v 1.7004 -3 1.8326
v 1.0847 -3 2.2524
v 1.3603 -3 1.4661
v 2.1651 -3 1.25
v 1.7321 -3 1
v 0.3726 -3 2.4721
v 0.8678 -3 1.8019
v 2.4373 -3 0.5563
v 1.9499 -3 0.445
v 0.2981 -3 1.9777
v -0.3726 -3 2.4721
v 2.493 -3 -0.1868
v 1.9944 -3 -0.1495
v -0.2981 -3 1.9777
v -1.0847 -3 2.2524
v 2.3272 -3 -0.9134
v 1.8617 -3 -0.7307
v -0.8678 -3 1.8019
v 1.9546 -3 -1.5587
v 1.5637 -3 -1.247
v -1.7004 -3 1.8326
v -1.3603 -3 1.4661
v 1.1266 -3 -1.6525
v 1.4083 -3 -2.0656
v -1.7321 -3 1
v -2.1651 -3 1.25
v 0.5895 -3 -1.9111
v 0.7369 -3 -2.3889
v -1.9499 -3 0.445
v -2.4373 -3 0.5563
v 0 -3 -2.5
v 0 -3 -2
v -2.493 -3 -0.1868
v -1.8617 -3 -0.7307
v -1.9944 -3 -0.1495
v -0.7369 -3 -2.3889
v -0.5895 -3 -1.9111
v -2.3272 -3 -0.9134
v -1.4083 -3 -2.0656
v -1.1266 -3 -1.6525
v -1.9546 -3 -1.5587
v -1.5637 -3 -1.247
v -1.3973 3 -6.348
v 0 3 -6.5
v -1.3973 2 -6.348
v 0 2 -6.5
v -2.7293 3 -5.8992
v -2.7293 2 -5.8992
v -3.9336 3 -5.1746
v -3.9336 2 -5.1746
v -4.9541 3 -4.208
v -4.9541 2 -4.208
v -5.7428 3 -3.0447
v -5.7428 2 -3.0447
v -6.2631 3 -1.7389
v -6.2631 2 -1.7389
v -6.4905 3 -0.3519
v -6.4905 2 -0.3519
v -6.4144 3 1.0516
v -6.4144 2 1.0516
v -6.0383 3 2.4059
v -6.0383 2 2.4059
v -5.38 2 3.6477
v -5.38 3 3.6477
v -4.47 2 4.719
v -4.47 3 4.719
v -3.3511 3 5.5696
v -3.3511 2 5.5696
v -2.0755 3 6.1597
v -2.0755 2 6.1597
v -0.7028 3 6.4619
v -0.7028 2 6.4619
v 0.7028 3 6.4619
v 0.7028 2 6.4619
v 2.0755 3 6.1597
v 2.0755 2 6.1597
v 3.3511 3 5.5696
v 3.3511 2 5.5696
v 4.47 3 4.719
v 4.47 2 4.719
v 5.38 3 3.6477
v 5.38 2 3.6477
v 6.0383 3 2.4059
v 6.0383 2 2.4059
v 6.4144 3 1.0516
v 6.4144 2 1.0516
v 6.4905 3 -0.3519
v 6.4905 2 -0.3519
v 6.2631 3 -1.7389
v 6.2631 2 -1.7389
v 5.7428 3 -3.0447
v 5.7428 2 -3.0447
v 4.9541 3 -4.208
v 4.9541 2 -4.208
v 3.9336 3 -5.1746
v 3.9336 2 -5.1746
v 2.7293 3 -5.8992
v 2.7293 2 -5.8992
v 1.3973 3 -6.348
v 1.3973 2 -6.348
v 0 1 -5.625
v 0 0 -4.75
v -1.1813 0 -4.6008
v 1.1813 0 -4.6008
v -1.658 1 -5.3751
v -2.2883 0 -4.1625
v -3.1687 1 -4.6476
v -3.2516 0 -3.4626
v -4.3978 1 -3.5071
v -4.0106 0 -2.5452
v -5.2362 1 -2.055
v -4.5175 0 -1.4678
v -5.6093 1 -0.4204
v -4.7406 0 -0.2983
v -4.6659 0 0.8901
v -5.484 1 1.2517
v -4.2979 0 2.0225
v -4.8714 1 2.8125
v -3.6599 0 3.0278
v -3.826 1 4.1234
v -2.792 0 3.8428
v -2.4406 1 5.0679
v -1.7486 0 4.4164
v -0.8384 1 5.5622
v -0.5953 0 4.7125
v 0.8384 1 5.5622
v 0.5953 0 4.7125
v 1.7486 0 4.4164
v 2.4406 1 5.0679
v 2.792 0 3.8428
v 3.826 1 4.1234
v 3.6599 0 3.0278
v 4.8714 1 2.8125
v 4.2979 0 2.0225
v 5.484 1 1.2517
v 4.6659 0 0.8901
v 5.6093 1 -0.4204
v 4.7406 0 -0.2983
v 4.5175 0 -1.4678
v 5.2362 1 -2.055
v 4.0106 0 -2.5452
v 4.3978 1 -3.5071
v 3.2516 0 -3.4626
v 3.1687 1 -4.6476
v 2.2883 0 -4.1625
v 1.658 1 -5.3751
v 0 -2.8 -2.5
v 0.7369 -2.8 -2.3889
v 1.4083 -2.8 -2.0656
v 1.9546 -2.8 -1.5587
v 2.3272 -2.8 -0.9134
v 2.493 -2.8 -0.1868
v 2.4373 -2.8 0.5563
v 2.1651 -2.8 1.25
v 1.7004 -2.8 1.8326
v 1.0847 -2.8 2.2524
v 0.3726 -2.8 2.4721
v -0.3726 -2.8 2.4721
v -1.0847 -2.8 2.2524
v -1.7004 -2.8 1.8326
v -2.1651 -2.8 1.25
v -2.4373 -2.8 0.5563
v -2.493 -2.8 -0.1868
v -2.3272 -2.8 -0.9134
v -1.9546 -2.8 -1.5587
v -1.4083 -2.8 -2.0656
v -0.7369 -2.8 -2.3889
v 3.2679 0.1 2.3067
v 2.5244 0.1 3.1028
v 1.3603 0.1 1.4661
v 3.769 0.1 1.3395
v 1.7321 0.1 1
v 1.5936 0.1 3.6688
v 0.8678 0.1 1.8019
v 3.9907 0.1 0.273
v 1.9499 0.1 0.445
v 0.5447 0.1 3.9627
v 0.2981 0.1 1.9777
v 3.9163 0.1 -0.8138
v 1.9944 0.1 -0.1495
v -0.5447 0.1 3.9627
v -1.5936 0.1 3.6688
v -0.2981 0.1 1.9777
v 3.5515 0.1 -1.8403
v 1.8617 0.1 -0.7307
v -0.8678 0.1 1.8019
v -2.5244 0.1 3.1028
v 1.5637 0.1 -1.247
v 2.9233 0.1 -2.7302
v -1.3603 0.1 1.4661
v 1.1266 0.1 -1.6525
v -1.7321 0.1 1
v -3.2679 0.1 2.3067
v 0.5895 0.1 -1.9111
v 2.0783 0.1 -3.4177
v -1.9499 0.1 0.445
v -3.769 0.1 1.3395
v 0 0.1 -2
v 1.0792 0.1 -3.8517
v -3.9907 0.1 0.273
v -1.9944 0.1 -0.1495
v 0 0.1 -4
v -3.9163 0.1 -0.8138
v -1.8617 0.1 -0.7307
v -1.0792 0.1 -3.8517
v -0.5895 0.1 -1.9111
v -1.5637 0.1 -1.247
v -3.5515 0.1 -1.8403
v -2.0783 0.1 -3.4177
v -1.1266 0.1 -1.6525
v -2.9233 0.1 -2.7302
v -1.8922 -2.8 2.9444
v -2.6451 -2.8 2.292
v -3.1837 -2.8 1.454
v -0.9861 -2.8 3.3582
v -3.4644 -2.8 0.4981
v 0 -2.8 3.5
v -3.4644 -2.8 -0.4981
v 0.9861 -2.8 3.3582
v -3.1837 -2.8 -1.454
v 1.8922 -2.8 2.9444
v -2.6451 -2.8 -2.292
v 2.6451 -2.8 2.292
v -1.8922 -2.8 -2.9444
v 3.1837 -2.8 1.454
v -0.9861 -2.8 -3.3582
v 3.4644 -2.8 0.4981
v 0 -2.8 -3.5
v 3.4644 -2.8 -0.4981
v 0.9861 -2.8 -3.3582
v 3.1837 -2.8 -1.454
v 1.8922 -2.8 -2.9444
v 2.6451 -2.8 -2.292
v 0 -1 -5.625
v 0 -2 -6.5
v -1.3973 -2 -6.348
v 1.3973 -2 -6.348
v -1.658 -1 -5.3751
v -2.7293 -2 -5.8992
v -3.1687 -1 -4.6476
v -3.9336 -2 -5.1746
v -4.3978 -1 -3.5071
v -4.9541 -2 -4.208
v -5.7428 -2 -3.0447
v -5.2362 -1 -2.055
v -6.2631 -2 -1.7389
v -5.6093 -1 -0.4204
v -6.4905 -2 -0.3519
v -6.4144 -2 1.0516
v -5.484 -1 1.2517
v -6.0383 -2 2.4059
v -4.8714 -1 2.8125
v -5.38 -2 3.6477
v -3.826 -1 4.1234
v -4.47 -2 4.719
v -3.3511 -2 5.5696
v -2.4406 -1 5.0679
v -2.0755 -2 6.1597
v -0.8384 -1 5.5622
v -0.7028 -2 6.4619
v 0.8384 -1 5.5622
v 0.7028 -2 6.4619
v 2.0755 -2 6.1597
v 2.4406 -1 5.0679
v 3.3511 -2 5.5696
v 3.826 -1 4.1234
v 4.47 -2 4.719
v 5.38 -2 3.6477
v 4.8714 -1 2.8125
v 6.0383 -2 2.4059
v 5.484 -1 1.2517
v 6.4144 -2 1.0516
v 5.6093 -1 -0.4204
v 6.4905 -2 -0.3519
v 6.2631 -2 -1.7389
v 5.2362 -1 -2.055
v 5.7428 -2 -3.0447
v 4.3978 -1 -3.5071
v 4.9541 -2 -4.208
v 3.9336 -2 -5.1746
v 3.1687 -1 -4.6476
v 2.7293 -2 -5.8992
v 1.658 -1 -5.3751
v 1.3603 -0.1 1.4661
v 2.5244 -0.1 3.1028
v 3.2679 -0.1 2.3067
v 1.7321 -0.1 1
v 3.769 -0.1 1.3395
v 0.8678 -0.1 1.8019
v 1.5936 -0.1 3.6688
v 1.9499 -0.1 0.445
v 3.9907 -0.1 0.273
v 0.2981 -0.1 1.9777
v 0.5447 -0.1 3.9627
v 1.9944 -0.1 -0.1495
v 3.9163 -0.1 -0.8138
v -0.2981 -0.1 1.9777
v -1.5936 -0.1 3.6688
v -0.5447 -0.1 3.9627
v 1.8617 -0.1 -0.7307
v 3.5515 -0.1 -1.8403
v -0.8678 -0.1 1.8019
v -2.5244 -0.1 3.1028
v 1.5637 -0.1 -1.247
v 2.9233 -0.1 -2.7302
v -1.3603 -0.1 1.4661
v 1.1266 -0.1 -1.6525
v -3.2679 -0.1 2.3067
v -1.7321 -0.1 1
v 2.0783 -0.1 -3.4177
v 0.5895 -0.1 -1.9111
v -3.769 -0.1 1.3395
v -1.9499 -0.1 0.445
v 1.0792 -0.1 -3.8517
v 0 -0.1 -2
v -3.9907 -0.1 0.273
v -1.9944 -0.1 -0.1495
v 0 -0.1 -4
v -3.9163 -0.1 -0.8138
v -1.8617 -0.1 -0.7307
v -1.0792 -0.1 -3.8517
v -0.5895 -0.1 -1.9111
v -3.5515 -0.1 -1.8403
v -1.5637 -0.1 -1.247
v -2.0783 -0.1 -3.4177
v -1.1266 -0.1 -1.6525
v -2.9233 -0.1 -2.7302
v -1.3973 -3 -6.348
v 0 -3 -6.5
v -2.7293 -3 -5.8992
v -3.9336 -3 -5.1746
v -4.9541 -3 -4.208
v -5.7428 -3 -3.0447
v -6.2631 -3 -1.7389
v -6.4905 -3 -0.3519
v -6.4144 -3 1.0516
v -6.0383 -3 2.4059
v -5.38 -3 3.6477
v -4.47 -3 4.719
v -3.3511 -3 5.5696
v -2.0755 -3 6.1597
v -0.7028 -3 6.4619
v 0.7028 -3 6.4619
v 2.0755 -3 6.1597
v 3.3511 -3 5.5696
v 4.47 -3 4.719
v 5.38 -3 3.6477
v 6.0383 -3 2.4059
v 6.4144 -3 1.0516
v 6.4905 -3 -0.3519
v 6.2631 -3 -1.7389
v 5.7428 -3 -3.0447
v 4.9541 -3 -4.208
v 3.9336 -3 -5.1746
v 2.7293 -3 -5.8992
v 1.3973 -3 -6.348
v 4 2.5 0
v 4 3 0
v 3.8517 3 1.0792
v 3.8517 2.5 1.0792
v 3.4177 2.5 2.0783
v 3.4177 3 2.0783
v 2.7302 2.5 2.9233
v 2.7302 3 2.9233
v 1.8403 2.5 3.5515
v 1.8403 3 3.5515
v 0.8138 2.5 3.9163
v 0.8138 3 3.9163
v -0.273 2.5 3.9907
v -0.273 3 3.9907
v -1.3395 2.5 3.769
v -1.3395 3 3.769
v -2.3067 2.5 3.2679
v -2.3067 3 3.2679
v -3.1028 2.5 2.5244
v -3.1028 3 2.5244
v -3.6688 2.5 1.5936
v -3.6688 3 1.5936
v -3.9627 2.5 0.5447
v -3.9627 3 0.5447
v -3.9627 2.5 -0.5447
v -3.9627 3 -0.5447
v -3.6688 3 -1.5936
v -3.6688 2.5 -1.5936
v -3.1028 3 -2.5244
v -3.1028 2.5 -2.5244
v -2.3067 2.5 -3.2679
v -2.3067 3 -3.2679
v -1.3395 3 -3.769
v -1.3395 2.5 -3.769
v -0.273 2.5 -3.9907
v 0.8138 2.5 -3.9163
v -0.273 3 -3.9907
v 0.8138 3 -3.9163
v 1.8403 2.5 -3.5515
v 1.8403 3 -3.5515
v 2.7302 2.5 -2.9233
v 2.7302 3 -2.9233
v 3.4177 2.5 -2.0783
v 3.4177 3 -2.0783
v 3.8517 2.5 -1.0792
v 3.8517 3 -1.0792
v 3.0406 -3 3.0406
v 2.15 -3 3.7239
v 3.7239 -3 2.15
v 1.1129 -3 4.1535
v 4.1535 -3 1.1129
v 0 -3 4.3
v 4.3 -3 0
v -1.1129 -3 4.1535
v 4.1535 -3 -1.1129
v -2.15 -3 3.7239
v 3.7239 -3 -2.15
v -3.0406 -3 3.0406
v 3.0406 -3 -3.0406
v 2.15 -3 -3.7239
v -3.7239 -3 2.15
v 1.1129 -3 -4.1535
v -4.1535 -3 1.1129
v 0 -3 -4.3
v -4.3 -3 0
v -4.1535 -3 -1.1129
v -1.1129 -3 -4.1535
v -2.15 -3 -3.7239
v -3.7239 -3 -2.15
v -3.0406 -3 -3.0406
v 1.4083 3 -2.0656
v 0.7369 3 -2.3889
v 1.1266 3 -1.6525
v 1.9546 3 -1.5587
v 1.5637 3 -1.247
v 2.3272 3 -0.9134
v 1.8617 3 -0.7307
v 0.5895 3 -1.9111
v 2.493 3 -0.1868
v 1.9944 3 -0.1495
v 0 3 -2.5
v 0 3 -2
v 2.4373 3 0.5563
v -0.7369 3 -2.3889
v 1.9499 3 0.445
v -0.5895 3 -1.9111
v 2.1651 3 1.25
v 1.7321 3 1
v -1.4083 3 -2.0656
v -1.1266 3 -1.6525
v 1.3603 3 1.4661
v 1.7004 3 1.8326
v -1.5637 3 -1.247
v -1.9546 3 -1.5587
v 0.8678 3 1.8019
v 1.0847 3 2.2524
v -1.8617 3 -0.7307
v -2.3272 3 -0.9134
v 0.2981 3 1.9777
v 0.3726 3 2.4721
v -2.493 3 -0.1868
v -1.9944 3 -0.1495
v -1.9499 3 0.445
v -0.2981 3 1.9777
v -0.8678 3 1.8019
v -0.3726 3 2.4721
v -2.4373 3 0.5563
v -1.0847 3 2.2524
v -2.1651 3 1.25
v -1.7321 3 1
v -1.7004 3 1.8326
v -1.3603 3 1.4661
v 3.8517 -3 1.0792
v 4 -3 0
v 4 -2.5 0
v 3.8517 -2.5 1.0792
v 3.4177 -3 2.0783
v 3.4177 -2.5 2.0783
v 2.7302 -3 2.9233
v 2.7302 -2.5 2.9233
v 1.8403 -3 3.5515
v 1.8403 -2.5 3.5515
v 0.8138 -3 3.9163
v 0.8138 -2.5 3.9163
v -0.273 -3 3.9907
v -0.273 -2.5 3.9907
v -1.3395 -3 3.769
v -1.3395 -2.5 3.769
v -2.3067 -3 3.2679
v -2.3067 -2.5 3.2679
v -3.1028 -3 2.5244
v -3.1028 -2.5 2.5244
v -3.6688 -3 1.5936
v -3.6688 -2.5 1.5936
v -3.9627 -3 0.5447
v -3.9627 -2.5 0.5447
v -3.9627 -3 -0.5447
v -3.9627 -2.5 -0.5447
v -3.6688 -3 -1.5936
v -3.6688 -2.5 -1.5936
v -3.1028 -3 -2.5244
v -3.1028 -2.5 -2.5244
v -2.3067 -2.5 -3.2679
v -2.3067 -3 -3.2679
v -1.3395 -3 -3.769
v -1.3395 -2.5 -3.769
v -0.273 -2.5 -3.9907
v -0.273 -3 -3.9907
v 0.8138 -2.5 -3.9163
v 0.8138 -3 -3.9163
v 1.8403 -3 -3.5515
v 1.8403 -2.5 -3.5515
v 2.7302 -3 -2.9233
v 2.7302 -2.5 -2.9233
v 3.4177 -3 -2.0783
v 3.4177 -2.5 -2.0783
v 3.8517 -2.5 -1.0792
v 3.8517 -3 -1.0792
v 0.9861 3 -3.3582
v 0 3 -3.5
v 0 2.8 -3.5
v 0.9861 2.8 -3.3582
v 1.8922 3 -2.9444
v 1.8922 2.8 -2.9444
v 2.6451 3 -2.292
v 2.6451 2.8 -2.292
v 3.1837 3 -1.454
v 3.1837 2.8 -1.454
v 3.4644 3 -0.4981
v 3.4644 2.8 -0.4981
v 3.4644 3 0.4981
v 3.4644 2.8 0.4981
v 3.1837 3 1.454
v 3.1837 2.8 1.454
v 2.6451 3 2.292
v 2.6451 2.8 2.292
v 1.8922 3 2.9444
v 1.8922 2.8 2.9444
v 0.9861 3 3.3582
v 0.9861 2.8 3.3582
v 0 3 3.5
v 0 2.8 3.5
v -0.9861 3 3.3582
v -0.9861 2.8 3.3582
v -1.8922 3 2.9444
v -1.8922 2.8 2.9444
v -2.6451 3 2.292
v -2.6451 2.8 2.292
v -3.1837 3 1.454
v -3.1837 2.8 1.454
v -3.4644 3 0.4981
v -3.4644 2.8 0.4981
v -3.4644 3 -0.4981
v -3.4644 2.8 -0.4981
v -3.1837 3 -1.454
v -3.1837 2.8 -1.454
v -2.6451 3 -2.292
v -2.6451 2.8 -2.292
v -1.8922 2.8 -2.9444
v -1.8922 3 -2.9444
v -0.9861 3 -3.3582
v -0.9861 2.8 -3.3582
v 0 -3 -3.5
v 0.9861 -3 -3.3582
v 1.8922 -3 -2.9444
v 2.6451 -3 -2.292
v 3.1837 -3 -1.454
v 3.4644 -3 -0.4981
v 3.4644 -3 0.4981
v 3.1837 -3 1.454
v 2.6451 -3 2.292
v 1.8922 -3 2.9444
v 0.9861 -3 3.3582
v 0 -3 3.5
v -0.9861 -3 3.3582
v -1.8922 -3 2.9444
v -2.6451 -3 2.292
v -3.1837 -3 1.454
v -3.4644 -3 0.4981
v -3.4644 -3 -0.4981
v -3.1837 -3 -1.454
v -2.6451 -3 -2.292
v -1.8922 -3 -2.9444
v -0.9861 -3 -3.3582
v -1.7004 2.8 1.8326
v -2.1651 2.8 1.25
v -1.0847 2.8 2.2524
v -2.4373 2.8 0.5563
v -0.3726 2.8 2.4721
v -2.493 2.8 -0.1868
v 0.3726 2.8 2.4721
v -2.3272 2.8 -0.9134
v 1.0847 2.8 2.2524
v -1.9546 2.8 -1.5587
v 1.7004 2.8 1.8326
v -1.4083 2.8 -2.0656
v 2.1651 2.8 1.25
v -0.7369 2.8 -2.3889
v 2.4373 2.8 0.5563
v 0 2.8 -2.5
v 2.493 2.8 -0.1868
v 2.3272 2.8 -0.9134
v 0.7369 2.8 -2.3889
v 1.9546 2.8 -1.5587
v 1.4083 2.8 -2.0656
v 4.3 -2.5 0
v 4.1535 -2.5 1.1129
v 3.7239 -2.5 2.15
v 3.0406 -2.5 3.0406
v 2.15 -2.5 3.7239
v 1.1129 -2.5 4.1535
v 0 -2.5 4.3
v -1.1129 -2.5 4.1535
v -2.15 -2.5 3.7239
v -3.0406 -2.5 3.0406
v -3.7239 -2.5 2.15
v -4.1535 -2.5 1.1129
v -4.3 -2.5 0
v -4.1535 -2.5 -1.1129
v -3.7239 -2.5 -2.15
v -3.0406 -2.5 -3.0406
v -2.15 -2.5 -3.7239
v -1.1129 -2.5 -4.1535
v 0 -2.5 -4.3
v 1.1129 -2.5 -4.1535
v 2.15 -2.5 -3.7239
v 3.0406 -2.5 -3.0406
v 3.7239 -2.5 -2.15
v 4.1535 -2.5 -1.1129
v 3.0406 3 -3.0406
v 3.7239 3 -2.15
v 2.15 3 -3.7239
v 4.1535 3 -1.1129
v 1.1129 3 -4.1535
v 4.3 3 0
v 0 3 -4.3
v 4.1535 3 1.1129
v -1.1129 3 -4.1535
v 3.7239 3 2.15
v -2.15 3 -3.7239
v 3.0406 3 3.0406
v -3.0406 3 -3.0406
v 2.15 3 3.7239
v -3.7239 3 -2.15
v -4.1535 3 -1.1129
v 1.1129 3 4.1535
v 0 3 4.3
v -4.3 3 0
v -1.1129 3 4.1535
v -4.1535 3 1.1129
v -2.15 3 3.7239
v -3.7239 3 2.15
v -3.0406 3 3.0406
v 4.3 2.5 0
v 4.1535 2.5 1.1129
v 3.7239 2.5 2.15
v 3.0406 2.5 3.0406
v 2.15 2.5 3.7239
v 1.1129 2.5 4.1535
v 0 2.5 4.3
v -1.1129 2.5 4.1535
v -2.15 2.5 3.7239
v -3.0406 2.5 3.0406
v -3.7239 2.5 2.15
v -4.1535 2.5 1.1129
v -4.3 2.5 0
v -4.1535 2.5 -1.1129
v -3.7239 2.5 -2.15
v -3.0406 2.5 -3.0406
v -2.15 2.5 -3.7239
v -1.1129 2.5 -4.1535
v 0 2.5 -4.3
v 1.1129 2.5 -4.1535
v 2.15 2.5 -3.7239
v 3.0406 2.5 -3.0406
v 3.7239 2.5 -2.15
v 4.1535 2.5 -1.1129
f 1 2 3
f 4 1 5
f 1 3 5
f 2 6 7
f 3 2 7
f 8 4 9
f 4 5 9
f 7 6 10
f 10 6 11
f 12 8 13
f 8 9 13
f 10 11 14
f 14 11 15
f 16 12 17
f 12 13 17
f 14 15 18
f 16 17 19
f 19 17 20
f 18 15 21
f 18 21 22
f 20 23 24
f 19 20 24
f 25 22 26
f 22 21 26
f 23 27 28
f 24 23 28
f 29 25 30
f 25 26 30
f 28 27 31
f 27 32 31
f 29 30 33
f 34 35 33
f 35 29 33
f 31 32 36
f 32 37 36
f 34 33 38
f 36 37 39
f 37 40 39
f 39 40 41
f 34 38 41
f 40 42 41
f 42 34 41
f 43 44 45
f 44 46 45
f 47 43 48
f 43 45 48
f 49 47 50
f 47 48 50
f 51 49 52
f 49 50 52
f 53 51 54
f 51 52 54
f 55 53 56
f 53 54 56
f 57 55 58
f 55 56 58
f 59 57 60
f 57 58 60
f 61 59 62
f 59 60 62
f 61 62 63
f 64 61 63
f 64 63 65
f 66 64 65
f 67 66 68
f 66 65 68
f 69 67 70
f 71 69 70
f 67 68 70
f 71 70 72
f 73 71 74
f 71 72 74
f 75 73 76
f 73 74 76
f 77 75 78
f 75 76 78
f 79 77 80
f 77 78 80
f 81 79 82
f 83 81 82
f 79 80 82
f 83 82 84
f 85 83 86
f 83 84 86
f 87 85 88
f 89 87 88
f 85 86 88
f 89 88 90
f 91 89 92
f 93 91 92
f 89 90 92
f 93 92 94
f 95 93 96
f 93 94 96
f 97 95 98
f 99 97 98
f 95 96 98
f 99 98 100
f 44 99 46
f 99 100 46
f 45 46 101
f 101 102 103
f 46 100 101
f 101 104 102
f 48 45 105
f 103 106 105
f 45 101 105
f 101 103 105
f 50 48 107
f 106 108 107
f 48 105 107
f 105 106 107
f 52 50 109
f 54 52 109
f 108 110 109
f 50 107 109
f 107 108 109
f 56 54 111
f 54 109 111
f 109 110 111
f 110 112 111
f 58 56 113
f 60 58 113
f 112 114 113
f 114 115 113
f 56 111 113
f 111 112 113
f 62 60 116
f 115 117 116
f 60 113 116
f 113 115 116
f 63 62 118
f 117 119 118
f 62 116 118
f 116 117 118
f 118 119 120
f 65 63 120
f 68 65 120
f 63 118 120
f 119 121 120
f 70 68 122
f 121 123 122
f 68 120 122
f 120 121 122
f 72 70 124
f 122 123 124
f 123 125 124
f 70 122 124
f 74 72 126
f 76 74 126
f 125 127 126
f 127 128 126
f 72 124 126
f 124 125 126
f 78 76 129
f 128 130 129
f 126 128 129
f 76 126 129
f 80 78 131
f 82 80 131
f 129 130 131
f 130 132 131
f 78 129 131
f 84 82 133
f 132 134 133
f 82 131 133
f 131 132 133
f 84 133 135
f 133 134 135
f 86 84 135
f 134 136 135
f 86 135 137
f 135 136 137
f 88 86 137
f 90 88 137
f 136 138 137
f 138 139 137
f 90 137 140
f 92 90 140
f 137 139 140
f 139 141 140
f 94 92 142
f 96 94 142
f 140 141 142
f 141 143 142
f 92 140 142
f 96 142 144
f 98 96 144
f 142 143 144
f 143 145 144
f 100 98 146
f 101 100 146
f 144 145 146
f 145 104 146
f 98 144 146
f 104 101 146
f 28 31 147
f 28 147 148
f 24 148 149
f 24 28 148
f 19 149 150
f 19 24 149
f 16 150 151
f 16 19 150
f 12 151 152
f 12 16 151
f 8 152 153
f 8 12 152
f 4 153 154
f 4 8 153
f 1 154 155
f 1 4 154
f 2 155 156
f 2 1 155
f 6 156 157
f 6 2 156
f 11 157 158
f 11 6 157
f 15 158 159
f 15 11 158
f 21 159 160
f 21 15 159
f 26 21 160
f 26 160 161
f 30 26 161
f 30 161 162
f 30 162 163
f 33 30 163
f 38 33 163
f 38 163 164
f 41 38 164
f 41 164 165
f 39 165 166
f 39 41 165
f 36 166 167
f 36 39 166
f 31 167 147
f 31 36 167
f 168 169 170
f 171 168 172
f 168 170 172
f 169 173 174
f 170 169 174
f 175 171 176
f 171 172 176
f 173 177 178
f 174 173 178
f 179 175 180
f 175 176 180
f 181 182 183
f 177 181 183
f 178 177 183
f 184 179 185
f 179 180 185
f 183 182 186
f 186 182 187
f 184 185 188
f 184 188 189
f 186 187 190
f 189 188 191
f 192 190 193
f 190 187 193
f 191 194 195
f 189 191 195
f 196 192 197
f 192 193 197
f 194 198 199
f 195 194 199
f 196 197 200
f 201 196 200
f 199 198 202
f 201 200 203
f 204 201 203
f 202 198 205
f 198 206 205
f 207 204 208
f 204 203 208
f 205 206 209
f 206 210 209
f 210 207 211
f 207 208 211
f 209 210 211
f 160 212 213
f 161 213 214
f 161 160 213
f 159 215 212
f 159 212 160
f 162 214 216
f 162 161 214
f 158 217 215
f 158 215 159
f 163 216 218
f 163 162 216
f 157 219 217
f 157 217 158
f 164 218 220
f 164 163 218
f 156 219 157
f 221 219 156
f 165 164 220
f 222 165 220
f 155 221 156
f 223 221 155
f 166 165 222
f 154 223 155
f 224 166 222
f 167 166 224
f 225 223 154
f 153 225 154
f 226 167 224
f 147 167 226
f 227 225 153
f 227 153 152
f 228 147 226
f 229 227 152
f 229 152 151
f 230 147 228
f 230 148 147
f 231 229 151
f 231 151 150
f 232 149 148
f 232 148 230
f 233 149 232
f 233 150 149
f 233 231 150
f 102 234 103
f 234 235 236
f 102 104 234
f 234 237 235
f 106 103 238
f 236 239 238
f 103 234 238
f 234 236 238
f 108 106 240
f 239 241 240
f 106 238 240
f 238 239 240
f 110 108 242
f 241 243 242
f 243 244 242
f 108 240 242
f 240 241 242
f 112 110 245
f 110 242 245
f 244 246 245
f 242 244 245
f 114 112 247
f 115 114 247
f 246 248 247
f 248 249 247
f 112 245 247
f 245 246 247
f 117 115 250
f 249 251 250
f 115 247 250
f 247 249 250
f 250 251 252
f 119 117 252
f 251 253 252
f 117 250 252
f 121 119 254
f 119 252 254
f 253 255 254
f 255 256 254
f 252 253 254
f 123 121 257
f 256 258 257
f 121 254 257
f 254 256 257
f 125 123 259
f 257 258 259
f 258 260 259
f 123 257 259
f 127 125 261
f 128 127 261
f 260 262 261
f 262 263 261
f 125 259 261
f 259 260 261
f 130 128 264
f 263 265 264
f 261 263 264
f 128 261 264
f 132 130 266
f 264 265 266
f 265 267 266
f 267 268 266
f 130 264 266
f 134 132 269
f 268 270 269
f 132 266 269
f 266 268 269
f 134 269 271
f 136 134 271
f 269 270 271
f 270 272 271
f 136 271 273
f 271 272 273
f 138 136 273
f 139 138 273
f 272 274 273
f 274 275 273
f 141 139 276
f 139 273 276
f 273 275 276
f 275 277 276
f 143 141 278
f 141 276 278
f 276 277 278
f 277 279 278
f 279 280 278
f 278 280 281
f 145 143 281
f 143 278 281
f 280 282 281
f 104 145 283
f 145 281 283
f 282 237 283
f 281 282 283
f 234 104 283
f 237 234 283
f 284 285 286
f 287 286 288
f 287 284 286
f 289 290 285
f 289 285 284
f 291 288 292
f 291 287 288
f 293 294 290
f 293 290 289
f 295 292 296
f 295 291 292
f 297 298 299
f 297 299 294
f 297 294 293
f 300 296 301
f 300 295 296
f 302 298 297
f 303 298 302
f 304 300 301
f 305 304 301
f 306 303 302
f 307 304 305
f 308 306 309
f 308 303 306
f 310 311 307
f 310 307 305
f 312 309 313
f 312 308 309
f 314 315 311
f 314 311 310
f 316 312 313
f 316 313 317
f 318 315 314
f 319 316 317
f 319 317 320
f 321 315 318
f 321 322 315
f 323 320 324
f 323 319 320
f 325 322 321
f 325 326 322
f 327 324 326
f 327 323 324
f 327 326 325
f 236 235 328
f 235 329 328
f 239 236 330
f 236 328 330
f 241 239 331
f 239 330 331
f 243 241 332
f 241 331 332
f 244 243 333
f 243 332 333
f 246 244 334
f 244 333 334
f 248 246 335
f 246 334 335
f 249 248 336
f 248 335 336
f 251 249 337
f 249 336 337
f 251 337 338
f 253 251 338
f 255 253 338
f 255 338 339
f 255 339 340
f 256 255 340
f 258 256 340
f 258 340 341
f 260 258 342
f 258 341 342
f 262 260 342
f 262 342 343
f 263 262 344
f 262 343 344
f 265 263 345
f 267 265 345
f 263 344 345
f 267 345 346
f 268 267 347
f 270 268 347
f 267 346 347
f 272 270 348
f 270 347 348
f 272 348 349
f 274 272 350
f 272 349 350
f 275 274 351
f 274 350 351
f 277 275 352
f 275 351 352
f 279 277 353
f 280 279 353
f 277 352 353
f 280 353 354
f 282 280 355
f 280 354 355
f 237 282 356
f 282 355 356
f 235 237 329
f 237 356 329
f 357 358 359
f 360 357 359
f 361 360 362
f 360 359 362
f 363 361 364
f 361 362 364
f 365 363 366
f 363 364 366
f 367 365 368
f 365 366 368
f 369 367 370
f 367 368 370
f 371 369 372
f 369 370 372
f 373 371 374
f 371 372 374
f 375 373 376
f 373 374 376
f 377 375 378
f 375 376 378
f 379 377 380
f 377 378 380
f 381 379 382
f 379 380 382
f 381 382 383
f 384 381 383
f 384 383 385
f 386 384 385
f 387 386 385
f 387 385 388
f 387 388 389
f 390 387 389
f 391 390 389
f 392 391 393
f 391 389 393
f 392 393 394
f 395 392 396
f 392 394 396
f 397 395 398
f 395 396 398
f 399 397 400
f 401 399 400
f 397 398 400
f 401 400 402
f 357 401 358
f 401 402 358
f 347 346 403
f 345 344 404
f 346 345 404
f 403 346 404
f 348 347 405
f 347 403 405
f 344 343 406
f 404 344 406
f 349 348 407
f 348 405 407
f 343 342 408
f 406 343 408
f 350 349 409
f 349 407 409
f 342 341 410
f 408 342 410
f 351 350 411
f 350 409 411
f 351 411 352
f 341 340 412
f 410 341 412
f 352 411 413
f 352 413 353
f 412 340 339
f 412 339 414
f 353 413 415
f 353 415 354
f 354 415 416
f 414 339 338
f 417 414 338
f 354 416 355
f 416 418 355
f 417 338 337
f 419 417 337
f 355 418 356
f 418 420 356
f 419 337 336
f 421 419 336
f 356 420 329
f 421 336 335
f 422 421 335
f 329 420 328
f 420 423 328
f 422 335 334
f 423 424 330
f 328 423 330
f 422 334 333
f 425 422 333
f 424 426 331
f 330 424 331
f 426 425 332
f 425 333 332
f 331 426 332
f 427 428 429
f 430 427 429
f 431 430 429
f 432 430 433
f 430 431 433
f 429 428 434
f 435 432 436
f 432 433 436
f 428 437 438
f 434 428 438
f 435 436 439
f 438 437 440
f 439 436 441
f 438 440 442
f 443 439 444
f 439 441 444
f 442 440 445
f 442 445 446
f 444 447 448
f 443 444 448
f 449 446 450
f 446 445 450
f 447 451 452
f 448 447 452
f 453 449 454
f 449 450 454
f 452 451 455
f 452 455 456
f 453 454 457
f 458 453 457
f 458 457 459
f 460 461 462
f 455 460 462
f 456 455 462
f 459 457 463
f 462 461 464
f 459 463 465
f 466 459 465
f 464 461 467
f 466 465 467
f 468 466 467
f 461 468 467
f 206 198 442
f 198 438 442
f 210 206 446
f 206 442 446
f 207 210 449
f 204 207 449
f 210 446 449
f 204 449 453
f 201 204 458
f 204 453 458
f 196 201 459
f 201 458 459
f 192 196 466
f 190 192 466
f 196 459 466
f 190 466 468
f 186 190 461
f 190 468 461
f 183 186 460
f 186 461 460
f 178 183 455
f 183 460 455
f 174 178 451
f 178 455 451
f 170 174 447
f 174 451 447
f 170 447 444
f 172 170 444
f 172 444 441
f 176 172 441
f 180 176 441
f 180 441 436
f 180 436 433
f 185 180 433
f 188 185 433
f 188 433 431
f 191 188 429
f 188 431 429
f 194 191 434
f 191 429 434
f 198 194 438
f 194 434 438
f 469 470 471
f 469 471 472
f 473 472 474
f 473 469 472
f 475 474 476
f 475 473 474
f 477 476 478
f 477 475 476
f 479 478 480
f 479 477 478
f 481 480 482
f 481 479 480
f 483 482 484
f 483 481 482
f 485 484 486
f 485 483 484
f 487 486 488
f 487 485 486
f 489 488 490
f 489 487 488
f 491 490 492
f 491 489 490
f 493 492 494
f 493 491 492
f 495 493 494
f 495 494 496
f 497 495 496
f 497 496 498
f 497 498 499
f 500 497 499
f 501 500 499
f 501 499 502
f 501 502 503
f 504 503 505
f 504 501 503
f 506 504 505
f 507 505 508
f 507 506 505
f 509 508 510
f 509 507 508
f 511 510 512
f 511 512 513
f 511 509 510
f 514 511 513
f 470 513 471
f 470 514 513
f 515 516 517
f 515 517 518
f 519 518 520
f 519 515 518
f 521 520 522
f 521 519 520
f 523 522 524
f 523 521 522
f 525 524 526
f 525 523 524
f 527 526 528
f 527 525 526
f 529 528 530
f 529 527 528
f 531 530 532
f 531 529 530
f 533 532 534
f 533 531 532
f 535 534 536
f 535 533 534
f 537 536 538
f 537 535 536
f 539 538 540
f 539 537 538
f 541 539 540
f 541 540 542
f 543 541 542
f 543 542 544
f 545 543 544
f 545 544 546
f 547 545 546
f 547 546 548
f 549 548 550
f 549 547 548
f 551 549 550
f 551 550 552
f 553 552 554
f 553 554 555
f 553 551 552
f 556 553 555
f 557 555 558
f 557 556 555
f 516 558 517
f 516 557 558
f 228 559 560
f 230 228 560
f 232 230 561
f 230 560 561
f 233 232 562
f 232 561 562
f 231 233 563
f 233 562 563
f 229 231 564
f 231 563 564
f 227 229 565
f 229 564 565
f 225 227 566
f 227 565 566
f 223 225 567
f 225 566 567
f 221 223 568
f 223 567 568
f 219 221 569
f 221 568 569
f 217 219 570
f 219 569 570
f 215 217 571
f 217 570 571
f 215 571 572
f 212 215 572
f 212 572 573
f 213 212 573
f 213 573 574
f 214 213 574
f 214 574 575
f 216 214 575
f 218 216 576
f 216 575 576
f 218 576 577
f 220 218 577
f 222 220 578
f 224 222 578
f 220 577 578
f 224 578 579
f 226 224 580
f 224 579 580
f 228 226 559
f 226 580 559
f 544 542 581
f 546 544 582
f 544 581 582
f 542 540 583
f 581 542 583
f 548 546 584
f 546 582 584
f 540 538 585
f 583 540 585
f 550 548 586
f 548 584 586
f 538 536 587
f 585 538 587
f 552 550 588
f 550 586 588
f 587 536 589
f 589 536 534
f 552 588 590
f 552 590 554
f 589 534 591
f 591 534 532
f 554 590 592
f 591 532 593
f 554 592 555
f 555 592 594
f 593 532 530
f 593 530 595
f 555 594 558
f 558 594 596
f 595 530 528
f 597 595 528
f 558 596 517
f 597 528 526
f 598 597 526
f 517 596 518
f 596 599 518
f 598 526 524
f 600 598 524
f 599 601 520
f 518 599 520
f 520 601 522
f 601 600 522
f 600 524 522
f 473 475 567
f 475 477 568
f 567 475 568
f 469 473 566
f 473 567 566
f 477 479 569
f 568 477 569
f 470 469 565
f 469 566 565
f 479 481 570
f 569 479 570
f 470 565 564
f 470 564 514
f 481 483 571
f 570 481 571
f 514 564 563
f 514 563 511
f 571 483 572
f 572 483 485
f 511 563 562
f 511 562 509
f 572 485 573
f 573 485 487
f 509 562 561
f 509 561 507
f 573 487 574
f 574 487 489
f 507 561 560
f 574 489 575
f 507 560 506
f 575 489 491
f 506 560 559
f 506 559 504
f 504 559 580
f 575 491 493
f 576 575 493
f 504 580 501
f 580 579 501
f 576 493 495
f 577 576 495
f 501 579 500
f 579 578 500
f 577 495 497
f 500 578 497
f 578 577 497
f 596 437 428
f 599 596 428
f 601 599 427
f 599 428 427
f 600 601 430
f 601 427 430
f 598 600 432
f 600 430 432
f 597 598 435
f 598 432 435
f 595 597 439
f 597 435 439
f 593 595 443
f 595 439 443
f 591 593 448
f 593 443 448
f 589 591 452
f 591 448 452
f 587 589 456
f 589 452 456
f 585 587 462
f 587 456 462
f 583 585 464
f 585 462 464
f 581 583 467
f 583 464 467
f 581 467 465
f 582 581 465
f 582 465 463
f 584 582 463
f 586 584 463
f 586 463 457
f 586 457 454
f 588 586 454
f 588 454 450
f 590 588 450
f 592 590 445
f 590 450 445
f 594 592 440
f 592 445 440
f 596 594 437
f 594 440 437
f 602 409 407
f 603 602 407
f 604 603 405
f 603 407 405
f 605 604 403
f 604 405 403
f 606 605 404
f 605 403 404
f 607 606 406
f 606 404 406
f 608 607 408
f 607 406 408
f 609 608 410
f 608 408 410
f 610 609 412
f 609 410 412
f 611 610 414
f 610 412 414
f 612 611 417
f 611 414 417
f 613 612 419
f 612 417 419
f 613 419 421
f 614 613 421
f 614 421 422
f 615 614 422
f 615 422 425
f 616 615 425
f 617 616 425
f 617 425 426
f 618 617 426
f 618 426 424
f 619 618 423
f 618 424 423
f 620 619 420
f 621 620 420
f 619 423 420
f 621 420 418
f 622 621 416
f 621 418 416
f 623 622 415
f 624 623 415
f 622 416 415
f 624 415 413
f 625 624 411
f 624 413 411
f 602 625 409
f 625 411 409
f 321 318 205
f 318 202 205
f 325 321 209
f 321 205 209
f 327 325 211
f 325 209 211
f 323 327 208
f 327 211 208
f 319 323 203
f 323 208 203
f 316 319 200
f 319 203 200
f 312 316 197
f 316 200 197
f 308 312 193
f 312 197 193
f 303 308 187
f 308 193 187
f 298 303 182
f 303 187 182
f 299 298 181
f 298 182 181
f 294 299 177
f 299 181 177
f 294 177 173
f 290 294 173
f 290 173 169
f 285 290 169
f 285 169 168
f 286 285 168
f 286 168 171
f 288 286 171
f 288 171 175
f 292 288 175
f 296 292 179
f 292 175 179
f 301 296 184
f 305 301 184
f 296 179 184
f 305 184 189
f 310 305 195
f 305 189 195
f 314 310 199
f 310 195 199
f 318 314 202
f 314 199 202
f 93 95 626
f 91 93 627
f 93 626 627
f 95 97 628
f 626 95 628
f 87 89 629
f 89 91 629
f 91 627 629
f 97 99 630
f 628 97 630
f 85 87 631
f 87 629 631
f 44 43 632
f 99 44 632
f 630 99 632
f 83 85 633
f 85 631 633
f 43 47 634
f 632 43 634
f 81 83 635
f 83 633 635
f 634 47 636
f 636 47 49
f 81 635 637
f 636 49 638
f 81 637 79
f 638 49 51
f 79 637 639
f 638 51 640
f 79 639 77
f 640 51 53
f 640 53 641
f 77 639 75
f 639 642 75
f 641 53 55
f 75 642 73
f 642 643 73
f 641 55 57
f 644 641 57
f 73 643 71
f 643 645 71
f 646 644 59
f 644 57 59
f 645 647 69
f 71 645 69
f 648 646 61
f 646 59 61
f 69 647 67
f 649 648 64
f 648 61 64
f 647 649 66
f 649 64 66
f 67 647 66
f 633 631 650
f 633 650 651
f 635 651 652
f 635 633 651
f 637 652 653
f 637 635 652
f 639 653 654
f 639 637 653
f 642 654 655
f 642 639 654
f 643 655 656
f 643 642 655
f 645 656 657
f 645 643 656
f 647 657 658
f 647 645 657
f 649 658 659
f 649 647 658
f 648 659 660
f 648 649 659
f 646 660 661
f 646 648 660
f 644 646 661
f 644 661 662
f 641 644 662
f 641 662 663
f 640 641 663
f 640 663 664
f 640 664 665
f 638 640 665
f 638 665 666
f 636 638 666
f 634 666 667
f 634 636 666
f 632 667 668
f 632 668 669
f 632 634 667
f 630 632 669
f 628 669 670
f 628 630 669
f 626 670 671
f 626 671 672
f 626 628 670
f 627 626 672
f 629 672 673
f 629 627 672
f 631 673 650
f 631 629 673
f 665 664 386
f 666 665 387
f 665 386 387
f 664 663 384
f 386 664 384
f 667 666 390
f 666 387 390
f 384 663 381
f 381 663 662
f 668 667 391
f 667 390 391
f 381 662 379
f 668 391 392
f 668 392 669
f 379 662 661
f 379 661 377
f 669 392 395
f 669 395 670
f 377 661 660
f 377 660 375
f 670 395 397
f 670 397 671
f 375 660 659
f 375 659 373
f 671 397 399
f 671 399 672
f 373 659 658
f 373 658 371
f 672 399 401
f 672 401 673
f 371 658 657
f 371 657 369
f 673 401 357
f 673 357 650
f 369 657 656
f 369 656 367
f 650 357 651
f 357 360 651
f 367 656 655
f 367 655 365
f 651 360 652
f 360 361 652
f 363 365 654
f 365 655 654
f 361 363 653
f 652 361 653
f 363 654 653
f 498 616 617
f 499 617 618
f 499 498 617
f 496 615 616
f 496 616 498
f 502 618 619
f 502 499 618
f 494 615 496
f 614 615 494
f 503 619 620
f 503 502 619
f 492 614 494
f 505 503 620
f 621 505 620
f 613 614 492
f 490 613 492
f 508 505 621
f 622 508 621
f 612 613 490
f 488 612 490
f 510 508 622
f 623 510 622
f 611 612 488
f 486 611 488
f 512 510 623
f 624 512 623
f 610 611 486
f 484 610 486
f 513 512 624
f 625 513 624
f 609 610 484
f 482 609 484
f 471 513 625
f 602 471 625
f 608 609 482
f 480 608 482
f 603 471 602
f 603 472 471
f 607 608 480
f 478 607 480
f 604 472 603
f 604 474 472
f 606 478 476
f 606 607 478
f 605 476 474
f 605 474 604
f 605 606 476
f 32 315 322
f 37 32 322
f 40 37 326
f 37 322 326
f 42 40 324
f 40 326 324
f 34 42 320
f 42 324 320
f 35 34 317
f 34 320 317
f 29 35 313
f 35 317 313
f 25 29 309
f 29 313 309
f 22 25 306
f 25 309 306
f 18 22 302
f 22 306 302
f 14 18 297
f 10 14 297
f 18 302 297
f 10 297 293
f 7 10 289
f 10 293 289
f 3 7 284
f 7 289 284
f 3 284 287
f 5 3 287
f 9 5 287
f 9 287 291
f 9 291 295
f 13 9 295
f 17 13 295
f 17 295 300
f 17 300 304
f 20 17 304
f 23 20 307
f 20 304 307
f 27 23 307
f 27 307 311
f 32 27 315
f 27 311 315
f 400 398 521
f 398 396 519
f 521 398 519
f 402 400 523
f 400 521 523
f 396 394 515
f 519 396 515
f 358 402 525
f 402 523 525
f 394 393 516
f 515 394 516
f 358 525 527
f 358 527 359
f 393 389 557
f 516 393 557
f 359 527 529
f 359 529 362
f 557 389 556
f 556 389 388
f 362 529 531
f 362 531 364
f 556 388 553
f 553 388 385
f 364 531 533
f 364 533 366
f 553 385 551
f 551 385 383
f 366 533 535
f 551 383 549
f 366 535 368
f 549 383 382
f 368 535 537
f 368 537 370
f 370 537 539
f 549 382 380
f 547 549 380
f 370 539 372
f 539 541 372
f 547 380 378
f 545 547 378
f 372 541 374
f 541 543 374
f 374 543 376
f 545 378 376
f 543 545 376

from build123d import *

# Parameters (mm, degrees)
SKETCH2_R               = 4.3
SKETCH2_R_2             = 4
CUT_EXTRUDE_THIN1_DEPTH = 0.5
SKETCH3_R               = 3.5
SKETCH3_R_2             = 2.5
CUT_EXTRUDE1_DEPTH      = 0.2
SKETCH4_R               = 4
CUT_EXTRUDE2_DEPTH      = 0.1


with BuildPart() as part:
    # Sketch1 → Revolve1 (revolve)
    with BuildSketch(Plane.XY, mode=Mode.PRIVATE) as revolve1_sk:
        Polygon((-6.5, 3), (-6.5, 2), (-4.75, 0), (-6.5, -2), (-6.5, -3), (-2, -3), (-2, 3), align=None)
    revolve(revolve1_sk.sketch.rotate(Axis((0, 0, 0), (0, 1, 0)), 270), axis=Axis((0, 0, 0), (0, 1, 0)))

    # Sketch2 → Cut-Extrude-Thin1 (cut)
    with BuildSketch(Plane.XZ.offset(3)):
        Circle(SKETCH2_R)
        Circle(SKETCH2_R_2, mode=Mode.SUBTRACT)
    cut_extrude_thin1 = extrude(amount=-CUT_EXTRUDE_THIN1_DEPTH, mode=Mode.SUBTRACT)

    # Sketch3 → Cut-Extrude1 (cut)
    with BuildSketch(Plane.XZ.offset(3)):
        with Locations(Location((0, 0, 0), (0, 0, 270))):
            Circle(SKETCH3_R)
        with Locations(Location((0, 0, 0), (0, 0, 270))):
            Circle(SKETCH3_R_2, mode=Mode.SUBTRACT)
    cut_extrude1 = extrude(amount=-CUT_EXTRUDE1_DEPTH, mode=Mode.SUBTRACT)

    # Mirror1: Cut-Extrude-Thin1, Cut-Extrude1 across plane
    add(cut_extrude_thin1.mirror(Plane.ZX), mode=Mode.SUBTRACT)
    add(cut_extrude1.mirror(Plane.ZX), mode=Mode.SUBTRACT)

    # Sketch4 → Cut-Extrude2 (cut, symmetric)
    with BuildSketch(Plane(origin=(0, 0, 0), x_dir=(1, 0, 0), z_dir=(0, 1, 0))):
        with Locations(Location((0, 0, 0), (0, 0, 90))):
            Circle(SKETCH4_R)
    extrude(amount=CUT_EXTRUDE2_DEPTH, both=True, mode=Mode.SUBTRACT)


solid = part.part
